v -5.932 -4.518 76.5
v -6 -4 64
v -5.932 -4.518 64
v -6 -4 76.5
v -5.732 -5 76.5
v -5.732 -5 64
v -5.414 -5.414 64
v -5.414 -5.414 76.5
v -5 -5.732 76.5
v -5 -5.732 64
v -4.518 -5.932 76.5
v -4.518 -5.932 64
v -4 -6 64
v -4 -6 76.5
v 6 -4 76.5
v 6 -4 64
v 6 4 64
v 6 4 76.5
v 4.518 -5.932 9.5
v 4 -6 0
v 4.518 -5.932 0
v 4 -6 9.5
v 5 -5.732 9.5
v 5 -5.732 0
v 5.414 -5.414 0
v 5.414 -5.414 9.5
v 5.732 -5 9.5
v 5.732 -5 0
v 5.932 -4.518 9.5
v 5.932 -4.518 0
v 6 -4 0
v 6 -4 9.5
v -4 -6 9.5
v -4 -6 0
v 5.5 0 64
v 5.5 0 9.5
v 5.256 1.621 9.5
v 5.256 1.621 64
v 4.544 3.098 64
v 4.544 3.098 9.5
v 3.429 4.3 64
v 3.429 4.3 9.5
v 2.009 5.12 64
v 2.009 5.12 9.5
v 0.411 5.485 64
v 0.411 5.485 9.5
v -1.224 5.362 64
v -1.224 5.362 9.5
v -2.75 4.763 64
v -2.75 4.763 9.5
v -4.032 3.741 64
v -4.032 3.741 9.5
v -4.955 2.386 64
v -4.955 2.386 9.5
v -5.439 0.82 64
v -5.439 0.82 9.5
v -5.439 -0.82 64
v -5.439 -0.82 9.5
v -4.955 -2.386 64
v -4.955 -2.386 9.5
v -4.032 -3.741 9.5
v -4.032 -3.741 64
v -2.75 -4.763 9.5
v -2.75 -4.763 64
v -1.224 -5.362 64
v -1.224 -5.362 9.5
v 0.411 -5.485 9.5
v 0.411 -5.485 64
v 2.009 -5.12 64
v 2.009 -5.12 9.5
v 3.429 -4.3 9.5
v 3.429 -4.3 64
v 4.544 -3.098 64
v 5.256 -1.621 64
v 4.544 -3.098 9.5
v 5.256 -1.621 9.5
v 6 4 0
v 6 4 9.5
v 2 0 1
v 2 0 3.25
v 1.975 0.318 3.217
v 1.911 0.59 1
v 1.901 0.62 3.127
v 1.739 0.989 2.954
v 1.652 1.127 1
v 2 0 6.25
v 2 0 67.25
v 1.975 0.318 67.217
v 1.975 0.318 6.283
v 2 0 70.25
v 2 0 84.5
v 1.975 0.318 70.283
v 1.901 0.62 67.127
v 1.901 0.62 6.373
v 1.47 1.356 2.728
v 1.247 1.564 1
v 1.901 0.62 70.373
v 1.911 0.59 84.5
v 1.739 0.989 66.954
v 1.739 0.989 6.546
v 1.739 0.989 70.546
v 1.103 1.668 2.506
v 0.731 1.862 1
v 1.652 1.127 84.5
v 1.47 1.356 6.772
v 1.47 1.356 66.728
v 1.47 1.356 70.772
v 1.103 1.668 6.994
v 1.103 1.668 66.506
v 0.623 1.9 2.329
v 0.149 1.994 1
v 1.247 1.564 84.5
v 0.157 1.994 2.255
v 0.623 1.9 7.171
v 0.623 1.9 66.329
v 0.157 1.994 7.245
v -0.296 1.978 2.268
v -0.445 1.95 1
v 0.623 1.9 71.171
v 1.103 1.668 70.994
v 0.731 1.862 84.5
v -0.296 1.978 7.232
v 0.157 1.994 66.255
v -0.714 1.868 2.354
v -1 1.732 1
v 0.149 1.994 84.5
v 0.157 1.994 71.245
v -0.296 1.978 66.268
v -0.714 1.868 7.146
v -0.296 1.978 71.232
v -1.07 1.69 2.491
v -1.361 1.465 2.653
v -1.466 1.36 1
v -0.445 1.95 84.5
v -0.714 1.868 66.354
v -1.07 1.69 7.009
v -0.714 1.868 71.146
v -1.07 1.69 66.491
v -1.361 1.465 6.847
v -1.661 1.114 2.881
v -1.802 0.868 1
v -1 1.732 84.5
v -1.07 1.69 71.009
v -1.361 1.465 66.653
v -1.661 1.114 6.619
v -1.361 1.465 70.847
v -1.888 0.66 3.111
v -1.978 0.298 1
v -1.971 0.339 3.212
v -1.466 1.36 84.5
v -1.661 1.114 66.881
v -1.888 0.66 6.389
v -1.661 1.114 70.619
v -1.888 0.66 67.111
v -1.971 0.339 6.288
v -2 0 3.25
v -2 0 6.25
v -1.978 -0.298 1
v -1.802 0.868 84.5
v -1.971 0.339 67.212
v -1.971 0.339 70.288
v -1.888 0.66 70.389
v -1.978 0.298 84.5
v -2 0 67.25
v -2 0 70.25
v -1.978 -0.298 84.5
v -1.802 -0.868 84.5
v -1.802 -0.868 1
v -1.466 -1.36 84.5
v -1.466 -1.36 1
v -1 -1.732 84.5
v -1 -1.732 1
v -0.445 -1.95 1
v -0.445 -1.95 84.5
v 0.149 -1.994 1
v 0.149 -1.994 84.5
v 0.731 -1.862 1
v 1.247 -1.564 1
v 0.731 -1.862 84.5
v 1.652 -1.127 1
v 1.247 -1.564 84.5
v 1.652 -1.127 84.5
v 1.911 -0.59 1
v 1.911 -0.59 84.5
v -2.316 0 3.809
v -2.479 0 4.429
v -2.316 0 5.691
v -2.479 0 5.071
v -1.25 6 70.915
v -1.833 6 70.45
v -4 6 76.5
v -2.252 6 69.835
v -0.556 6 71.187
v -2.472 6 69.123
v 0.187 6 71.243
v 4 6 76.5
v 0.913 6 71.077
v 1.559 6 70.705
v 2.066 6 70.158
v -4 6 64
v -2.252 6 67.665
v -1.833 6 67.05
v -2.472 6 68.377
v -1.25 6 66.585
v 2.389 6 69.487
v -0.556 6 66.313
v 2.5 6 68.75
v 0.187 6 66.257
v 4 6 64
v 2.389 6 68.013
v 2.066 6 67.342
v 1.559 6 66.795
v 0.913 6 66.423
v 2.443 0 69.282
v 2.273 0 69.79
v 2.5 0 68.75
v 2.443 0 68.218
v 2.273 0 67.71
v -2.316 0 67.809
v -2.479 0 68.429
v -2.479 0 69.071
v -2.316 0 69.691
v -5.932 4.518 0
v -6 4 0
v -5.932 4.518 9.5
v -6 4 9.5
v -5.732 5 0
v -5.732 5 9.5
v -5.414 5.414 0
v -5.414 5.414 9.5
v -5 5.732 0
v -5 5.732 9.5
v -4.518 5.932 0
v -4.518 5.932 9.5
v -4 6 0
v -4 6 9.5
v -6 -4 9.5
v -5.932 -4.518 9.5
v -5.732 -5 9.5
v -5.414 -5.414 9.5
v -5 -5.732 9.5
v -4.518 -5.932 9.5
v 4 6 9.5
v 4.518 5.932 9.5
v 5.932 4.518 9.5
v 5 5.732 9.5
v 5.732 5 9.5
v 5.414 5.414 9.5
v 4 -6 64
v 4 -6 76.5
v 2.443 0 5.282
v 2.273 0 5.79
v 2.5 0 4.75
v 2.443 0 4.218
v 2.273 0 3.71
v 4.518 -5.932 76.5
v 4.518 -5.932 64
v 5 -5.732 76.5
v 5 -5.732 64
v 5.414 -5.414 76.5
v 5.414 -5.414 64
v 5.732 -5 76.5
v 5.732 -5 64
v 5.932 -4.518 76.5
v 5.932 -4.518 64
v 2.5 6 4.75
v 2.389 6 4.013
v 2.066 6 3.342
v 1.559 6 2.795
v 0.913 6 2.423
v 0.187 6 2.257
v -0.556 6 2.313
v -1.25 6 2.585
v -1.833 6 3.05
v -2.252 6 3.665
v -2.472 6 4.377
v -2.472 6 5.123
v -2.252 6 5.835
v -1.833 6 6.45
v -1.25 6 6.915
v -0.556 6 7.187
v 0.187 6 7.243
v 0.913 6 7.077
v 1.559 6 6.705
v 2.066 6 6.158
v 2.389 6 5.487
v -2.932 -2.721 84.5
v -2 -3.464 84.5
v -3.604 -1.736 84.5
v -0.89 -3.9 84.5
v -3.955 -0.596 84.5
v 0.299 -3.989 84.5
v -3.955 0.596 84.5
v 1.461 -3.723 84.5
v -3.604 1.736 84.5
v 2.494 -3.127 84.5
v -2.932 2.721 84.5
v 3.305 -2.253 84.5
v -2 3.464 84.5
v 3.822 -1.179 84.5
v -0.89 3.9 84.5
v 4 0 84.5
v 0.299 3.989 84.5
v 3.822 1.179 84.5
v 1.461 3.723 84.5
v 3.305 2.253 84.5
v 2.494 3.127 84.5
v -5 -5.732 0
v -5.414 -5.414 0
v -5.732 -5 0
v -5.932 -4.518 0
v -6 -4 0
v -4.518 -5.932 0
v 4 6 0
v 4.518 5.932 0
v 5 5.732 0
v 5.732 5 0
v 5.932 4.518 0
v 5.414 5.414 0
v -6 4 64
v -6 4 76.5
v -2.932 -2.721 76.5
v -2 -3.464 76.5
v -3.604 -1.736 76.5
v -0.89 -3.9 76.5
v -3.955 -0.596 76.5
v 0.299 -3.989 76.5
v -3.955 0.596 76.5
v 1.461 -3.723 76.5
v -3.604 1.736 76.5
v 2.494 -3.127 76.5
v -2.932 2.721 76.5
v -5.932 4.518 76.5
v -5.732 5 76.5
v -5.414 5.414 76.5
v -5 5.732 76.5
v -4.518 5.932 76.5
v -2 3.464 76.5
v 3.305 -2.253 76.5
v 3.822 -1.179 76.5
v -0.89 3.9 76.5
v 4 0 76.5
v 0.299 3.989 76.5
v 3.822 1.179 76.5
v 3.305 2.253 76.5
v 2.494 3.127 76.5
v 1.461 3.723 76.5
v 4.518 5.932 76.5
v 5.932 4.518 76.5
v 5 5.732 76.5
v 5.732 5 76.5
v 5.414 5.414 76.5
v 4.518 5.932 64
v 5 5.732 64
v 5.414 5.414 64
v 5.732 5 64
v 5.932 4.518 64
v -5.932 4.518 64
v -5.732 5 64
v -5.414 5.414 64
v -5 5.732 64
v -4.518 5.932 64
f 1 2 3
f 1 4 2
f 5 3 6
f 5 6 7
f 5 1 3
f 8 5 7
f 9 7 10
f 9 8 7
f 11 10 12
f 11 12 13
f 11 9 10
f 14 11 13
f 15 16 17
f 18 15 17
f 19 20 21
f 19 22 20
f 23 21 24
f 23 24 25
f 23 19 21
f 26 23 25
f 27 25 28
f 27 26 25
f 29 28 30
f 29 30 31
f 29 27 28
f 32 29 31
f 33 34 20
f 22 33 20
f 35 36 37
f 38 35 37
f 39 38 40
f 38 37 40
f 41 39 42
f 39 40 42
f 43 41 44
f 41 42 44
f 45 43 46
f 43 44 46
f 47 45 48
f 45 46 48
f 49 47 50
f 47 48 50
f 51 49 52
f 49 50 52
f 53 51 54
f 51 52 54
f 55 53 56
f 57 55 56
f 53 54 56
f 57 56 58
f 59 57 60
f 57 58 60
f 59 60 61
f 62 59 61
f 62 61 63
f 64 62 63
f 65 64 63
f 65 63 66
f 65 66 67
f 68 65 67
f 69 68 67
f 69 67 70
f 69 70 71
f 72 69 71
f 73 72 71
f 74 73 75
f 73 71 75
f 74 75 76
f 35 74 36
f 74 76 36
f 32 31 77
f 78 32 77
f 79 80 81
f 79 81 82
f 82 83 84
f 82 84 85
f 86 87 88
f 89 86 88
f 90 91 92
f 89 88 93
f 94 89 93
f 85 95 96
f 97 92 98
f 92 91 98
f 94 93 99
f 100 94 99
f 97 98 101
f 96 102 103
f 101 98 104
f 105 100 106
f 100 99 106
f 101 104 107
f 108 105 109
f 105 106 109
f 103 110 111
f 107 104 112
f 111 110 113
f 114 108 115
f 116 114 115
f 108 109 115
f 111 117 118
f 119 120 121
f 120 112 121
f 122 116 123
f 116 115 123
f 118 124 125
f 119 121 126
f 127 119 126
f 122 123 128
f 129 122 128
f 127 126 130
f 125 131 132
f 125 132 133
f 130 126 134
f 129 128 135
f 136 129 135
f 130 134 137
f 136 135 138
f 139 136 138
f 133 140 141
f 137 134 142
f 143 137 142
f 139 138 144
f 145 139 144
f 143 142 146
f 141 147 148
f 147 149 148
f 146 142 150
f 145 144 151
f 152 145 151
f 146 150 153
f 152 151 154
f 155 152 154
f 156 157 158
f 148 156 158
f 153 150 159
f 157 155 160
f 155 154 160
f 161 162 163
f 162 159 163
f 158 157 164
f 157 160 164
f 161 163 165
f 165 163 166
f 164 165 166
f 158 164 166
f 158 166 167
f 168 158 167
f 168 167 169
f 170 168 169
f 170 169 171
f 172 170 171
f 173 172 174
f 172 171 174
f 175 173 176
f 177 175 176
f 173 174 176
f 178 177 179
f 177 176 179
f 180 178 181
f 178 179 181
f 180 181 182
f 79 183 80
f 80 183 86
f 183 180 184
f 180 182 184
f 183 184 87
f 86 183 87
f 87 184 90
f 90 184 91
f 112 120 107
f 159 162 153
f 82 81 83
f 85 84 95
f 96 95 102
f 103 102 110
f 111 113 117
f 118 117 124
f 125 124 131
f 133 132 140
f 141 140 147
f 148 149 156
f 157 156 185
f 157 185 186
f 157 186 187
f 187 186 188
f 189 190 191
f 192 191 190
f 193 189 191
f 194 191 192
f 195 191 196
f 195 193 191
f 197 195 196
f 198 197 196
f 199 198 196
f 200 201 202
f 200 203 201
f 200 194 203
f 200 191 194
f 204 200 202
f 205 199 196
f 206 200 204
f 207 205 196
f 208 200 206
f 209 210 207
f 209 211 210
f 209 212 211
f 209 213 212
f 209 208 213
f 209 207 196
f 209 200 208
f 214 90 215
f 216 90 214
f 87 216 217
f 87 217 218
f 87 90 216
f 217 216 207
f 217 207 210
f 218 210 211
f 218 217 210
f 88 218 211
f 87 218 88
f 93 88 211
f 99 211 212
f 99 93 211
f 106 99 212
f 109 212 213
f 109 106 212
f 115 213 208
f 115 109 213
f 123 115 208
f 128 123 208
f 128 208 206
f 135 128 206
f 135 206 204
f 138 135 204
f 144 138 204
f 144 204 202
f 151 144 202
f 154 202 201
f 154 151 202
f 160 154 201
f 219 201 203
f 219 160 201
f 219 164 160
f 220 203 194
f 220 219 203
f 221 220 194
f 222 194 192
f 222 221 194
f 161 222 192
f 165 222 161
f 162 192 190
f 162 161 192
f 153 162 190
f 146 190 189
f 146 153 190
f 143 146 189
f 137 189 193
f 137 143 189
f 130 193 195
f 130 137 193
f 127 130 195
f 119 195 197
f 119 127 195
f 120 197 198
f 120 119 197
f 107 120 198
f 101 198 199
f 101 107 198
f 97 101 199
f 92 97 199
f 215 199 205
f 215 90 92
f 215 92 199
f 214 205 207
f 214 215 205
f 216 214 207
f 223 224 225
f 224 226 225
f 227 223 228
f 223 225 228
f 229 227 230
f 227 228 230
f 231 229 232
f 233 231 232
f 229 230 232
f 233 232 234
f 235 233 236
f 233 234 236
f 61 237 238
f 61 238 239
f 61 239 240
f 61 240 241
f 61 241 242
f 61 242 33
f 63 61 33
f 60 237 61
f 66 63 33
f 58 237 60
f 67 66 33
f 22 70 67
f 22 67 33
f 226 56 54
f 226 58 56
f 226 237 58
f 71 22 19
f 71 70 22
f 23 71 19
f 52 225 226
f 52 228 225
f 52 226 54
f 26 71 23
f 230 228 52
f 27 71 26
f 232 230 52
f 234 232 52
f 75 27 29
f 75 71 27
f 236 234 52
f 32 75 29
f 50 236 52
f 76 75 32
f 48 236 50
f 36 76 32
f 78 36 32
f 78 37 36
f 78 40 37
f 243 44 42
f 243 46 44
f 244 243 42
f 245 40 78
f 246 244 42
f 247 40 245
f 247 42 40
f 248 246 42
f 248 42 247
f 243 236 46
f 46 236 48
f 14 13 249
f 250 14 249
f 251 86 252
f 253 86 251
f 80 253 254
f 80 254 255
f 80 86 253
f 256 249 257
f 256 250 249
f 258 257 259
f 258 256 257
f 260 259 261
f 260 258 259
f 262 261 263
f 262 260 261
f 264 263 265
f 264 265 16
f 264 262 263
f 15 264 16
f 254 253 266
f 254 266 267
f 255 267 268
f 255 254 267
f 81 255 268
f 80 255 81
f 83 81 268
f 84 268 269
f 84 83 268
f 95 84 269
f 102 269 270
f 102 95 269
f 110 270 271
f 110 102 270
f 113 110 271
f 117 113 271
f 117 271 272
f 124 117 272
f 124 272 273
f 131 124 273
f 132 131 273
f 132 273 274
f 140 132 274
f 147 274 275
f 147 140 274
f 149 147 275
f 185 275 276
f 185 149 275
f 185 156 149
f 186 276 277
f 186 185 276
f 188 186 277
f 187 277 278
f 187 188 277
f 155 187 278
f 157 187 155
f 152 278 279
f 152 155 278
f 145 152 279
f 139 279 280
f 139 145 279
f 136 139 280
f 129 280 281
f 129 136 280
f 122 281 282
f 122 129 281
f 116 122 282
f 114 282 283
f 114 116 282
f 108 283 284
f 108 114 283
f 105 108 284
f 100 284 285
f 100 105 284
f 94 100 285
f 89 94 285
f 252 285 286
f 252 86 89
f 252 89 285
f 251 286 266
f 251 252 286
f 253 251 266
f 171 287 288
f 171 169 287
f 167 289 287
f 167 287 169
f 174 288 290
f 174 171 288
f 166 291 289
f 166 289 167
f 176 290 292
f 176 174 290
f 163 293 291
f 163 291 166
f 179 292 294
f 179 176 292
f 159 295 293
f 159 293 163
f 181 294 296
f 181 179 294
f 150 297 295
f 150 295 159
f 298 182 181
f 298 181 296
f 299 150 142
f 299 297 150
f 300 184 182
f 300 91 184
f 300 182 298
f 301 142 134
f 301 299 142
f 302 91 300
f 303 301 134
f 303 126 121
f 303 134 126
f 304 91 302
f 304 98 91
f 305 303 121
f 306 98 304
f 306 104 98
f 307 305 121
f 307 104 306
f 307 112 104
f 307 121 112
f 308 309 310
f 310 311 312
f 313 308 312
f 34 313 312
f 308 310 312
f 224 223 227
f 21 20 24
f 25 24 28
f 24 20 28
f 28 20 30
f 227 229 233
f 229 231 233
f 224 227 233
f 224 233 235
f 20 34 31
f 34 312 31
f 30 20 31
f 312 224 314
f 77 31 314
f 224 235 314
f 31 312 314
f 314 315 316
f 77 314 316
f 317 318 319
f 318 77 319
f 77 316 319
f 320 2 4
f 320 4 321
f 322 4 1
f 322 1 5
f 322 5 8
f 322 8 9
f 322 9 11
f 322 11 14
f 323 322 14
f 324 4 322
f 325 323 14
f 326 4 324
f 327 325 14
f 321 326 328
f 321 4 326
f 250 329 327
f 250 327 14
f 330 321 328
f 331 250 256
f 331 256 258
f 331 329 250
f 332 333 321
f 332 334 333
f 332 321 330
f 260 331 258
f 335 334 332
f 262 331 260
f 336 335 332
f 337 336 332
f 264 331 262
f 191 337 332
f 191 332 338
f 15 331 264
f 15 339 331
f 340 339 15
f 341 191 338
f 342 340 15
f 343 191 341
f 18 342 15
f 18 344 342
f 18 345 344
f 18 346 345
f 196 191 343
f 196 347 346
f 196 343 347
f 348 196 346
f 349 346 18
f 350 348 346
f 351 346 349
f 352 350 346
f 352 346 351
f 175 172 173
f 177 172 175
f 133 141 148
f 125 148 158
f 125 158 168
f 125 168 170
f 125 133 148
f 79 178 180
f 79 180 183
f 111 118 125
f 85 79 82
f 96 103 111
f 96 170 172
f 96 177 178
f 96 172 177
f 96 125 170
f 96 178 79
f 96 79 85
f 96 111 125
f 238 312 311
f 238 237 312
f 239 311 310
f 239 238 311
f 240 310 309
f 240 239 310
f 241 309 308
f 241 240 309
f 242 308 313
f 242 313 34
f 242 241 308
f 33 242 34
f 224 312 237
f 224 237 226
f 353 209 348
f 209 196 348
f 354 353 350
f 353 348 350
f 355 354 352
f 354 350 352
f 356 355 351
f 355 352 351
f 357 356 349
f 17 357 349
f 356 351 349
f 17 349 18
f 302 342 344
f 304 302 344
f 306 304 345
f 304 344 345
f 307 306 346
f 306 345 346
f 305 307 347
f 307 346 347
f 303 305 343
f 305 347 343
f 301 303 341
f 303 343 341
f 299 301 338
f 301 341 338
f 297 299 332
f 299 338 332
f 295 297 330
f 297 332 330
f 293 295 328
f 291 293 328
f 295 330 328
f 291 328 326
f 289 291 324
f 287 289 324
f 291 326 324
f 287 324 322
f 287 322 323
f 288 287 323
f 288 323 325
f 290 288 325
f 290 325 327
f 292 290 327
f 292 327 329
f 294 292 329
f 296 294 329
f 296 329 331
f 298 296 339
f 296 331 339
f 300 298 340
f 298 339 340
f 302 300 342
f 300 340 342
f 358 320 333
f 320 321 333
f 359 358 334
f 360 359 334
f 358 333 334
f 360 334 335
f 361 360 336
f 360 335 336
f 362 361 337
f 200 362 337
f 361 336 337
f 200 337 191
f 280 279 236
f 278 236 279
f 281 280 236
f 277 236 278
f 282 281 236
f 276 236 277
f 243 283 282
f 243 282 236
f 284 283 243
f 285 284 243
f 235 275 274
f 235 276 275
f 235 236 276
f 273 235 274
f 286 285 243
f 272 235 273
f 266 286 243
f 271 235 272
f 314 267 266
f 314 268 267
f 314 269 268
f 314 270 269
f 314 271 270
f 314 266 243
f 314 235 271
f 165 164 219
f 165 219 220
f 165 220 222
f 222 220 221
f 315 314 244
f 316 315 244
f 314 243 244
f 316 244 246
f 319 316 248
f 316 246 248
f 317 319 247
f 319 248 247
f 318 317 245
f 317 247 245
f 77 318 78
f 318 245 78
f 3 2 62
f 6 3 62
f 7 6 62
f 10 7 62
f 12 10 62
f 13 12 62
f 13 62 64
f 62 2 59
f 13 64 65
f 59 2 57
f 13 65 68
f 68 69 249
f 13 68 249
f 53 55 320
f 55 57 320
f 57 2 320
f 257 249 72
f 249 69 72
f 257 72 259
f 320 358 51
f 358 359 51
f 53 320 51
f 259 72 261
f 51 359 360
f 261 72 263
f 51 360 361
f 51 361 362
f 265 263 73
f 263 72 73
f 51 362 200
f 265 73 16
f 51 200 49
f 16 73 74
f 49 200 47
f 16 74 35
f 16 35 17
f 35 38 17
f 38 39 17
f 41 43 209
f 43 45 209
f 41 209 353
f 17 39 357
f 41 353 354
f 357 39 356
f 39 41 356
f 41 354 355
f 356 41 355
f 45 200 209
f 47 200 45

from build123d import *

# Parameters (mm, degrees)
SKETCH_1_W          = 12
SKETCH_1_H          = 12
EXTRUDE_1_DEPTH     = 9.5
SKETCH_2_R          = 5.5
EXTRUDE_2_DEPTH     = 54.5
SKETCH_3_W          = 12
SKETCH_3_H          = 12
EXTRUDE_3_DEPTH     = 12.5
SKETCH_4_R          = 4
EXTRUDE_4_DEPTH     = 8
SKETCH_5_R          = 2
CUT_EXTRUDE_1_DEPTH = 83.5
CUT_EXTRUDE_START   = -6
SKETCH_6_R          = 2.5
CUT_EXTRUDE_2_DEPTH = 6
FILLET_1_R          = 2


with BuildPart() as part:
    # 草图1 → 凸台-拉伸1 (new body)
    with BuildSketch(Plane.XY):
        Rectangle(SKETCH_1_W, SKETCH_1_H)
    extrude(amount=EXTRUDE_1_DEPTH)

    # 草图2 → 凸台-拉伸2 (add)
    with BuildSketch(Plane.XY.offset(9.5)):
        Circle(SKETCH_2_R)
    extrude(amount=EXTRUDE_2_DEPTH)

    # 草图3 → 凸台-拉伸3 (add)
    with BuildSketch(Plane.XY.offset(64)):
        Rectangle(SKETCH_3_W, SKETCH_3_H)
    extrude(amount=EXTRUDE_3_DEPTH)

    # 草图4 → 凸台-拉伸4 (add)
    with BuildSketch(Plane.XY.offset(76.5)):
        Circle(SKETCH_4_R)
    extrude(amount=EXTRUDE_4_DEPTH)

    # 草图5 → 切除-拉伸1 (cut)
    with BuildSketch(Plane.XY.offset(84.5)):
        Circle(SKETCH_5_R)
    extrude(amount=-CUT_EXTRUDE_1_DEPTH, mode=Mode.SUBTRACT)

    # 草图6 → 切除-拉伸2 (cut)
    with BuildSketch(Plane(origin=(0, 6, 0), x_dir=(1, 0, 0), z_dir=(0, 1, 0)).offset(CUT_EXTRUDE_START)):
        with Locations((0, -4.75)):
            Circle(SKETCH_6_R)
        with Locations((0, -68.75)):
            Circle(SKETCH_6_R)
    extrude(amount=CUT_EXTRUDE_2_DEPTH, mode=Mode.SUBTRACT)

    # 圆角1
    fillet_1_edges = [part.edges().sort_by_distance(p)[0] for p in [
        (6, -6, 70.25),
        (6, 6, 70.25),
        (-6, 6, 70.25),
        (-6, -6, 70.25),
        (6, -6, 4.75),
        (-6, -6, 4.75),
        (-6, 6, 4.75),
        (6, 6, 4.75),
    ]]
    fillet(fillet_1_edges, radius=FILLET_1_R)


solid = part.part
